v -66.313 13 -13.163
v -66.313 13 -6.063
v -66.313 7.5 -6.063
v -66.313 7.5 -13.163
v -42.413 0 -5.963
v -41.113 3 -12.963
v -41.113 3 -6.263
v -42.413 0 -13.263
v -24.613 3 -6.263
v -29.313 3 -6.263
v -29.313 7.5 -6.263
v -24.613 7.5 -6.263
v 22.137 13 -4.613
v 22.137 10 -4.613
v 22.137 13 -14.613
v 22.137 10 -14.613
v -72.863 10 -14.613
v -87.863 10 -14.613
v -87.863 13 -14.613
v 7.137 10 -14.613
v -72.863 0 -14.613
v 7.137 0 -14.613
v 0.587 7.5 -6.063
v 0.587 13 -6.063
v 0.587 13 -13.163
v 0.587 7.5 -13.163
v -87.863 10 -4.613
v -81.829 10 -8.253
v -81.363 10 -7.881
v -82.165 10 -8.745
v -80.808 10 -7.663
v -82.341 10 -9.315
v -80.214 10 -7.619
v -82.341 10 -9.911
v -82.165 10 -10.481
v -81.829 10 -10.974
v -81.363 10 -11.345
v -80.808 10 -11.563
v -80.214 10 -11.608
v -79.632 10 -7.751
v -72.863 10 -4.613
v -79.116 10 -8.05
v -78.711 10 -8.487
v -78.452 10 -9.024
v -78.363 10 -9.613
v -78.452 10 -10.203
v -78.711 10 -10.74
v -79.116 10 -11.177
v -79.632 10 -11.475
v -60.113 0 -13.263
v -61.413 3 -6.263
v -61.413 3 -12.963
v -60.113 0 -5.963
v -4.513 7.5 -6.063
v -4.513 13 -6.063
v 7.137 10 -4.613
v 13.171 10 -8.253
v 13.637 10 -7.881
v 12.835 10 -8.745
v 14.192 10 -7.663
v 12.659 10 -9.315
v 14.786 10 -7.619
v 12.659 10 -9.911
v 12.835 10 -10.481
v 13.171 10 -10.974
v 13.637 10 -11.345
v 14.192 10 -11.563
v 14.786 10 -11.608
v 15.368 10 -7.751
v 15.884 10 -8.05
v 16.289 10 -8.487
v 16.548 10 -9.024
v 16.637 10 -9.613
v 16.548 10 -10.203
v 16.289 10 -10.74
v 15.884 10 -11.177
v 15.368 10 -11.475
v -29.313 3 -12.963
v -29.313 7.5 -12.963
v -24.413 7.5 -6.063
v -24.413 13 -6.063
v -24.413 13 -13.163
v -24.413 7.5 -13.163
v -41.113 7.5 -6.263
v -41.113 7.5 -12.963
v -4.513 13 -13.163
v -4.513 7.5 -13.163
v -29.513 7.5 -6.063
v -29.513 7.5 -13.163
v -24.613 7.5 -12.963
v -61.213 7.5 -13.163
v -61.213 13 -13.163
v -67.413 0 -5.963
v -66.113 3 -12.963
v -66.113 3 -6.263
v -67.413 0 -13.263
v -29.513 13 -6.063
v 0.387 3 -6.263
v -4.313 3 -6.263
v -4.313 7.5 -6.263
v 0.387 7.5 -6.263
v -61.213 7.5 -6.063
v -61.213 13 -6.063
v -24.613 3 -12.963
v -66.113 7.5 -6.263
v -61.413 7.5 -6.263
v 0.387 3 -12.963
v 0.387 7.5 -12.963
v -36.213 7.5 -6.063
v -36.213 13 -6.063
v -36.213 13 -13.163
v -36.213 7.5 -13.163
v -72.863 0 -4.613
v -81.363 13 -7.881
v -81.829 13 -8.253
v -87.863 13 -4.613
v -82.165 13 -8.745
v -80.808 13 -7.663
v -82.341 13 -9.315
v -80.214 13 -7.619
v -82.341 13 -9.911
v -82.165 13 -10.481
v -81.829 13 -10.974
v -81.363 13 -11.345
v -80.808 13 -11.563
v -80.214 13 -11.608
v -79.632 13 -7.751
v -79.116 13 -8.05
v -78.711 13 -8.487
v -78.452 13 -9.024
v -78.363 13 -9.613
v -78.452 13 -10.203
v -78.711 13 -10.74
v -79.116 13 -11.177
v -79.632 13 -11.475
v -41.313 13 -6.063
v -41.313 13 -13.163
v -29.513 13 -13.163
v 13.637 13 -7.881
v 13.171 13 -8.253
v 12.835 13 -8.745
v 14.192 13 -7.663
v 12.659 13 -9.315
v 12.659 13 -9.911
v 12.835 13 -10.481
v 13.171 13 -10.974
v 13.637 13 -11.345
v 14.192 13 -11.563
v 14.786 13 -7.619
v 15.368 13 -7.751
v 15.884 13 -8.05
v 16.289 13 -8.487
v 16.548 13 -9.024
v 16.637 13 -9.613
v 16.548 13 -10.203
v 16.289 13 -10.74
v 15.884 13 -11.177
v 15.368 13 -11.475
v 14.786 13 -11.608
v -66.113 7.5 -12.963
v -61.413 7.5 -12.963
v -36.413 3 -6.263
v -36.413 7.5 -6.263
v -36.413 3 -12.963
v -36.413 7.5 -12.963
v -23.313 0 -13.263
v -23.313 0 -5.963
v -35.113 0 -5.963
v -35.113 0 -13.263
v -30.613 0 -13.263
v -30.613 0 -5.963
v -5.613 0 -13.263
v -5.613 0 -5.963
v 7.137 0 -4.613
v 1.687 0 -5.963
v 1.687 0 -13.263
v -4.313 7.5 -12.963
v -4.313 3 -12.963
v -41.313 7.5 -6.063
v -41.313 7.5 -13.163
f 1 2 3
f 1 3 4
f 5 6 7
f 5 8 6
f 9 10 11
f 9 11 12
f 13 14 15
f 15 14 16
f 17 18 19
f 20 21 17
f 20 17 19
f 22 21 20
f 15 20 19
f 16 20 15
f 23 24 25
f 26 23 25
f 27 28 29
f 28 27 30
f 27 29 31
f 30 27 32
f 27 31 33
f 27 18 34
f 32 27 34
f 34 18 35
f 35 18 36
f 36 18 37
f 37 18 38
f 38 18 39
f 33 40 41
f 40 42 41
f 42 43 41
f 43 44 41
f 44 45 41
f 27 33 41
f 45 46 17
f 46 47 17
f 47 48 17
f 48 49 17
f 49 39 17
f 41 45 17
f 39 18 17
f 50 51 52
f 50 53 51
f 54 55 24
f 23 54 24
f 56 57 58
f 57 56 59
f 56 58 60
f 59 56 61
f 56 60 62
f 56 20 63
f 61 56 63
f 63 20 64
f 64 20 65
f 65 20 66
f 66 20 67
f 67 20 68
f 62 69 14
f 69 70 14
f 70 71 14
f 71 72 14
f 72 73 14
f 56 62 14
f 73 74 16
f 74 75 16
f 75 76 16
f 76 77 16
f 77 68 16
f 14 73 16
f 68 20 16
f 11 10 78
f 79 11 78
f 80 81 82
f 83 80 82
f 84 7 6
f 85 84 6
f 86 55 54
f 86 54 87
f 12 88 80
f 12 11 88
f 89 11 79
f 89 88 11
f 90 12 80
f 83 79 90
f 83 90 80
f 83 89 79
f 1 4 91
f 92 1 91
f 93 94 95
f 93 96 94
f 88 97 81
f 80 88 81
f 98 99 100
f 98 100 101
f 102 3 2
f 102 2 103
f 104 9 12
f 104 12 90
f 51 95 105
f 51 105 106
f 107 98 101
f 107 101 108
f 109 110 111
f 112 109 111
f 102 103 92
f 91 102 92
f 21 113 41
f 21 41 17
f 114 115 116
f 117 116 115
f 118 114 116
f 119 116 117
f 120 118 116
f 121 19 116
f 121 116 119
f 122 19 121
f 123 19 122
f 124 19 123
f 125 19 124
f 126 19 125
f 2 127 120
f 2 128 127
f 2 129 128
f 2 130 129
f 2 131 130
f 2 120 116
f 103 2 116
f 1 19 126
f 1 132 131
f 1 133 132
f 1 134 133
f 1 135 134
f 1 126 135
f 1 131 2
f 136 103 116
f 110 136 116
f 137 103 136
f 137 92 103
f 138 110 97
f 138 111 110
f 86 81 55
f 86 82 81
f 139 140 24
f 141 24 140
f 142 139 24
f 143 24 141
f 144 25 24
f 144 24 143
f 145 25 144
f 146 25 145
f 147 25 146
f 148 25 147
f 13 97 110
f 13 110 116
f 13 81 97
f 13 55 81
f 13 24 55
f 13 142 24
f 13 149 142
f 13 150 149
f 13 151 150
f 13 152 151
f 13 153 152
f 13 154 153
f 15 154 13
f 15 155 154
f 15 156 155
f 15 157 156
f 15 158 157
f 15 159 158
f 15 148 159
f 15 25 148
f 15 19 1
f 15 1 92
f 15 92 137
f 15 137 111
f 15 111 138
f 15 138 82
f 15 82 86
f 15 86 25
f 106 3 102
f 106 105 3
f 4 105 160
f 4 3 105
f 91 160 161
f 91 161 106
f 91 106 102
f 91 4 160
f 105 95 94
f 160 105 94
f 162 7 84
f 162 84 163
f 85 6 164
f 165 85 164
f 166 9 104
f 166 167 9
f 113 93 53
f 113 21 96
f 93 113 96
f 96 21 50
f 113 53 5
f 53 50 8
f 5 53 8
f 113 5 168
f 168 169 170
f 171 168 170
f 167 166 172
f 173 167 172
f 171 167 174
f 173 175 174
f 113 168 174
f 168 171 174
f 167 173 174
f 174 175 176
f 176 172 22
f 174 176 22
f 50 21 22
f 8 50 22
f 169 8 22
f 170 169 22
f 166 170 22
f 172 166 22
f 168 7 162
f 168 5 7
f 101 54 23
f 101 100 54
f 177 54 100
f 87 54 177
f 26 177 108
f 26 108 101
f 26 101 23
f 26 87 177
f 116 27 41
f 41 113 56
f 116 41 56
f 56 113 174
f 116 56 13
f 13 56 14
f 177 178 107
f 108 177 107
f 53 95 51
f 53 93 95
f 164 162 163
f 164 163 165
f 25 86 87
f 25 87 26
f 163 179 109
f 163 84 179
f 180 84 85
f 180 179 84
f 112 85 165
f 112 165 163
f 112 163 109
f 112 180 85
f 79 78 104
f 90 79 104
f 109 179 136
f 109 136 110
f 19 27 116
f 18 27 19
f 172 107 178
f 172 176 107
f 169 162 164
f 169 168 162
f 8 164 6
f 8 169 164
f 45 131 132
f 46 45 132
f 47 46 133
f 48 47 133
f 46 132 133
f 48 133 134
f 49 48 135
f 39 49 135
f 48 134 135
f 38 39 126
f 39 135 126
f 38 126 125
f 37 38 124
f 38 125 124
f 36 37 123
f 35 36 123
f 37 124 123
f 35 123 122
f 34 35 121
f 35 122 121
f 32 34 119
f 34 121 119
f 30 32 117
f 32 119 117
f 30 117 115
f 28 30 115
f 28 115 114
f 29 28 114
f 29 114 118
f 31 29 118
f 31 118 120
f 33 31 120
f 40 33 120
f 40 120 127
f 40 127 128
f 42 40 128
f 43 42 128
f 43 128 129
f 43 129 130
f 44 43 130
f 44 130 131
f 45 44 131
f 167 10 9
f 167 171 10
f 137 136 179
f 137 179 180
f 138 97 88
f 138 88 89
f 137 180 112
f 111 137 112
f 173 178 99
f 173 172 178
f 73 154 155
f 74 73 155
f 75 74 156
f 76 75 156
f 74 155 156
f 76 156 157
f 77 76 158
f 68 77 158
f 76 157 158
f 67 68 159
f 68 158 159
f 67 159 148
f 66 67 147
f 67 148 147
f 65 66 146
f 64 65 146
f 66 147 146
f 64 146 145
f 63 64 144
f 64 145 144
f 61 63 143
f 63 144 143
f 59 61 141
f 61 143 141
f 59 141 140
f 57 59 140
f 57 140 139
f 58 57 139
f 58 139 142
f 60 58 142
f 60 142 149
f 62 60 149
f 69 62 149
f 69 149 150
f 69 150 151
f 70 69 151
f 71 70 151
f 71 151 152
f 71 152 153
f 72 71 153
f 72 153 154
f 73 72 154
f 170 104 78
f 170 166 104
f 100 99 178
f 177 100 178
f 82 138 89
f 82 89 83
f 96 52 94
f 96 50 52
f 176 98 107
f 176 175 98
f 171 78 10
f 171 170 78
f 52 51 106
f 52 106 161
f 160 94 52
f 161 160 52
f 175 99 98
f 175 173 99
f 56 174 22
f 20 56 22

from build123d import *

# Parameters (mm, degrees)
SKETCH1_W           = 80
SKETCH1_H           = 10
BOSS_EXTRUDE1_DEPTH = 10
SKETCH2_W           = 4.7
SKETCH2_H           = 6.7
CUT_EXTRUDE1_DEPTH  = 7
SKETCH3_W           = 4.7
SKETCH3_H           = 6.7
SKETCH4_W           = 7.3
SKETCH4_H           = 7.3
SKETCH5_W           = 4.7
SKETCH5_H           = 6.7
SKETCH6_W           = 7.3
SKETCH6_H           = 7.3
SKETCH8_W           = 4.7
SKETCH8_H           = 6.7
SKETCH9_W           = 7.3
SKETCH9_H           = 7.3
SKETCH10_W          = 4.7
SKETCH10_H          = 6.7
SKETCH11_W          = 7.3
SKETCH11_H          = 7.3
SKETCH12_W          = 110
SKETCH12_H          = 10
SKETCH12_W_2        = 4.7
SKETCH12_H_2        = 6.7
BOSS_EXTRUDE2_DEPTH = 3
SKETCH13_W          = 5.1
SKETCH13_H          = 7.1
CUT_EXTRUDE2_DEPTH  = 5.5
SKETCH14_R          = 2
CUT_EXTRUDE3_DEPTH  = 10


with BuildPart() as part:
    # Sketch1 → Boss-Extrude1 (new body)
    with BuildSketch(Plane(origin=(0, 0, 0), x_dir=(1, 0, 0), z_dir=(0, 1, 0))):
        with Locations((-32.862980486, 9.613188287)):
            Rectangle(SKETCH1_W, SKETCH1_H)
    extrude(amount=BOSS_EXTRUDE1_DEPTH)

    # Sketch2 → Cut-Extrude1 (cut)
    with BuildSketch(Plane(origin=(0, 10, 0), x_dir=(1, 0, 0), z_dir=(0, 1, 0))):
        with Locations((-26.962980486, 9.613188287)):
            Rectangle(SKETCH2_W, SKETCH2_H)
        with Locations((-38.762980486, 9.613188287)):
            Rectangle(SKETCH2_W, SKETCH2_H)
        with Locations((-1.962980486, 9.613188287)):
            Rectangle(SKETCH2_W, SKETCH2_H)
        with Locations((-63.762980486, 9.613188287)):
            Rectangle(SKETCH2_W, SKETCH2_H)
    extrude(amount=-CUT_EXTRUDE1_DEPTH, mode=Mode.SUBTRACT)

    # Sketch3 → Cut-Loft1 section 0
    with BuildSketch(Plane(origin=(0, 3, 0), x_dir=(1, 0, 0), z_dir=(0, 1, 0))):
        with Locations((-38.762980486, 9.613188287)):
            Rectangle(SKETCH3_W, SKETCH3_H)
    # Sketch4 → Cut-Loft1 section 1
    with BuildSketch(Plane.XZ):
        with Locations((-38.762980486, -9.613188287)):
            Rectangle(SKETCH4_W, SKETCH4_H)
    loft(mode=Mode.SUBTRACT)

    # Sketch5 → Cut-Loft2 section 0
    with BuildSketch(Plane(origin=(0, 3, 0), x_dir=(1, 0, 0), z_dir=(0, 1, 0))):
        with Locations((-63.762980486, 9.613188287)):
            Rectangle(SKETCH5_W, SKETCH5_H)
    # Sketch6 → Cut-Loft2 section 1
    with BuildSketch(Plane.XZ):
        with Locations((-63.762980486, -9.613188287)):
            Rectangle(SKETCH6_W, SKETCH6_H)
    loft(mode=Mode.SUBTRACT)

    # Sketch8 → Cut-Loft3 section 0
    with BuildSketch(Plane(origin=(0, 3, 0), x_dir=(1, 0, 0), z_dir=(0, 1, 0))):
        with Locations((-26.962980486, 9.613188287)):
            Rectangle(SKETCH8_W, SKETCH8_H)
    # Sketch9 → Cut-Loft3 section 1
    with BuildSketch(Plane.XZ):
        with Locations((-26.962980486, -9.613188287)):
            Rectangle(SKETCH9_W, SKETCH9_H)
    loft(mode=Mode.SUBTRACT)

    # Sketch10 → Cut-Loft4 section 0
    with BuildSketch(Plane(origin=(0, 3, 0), x_dir=(1, 0, 0), z_dir=(0, 1, 0))):
        with Locations((-1.962980486, 9.613188287)):
            Rectangle(SKETCH10_W, SKETCH10_H)
    # Sketch11 → Cut-Loft4 section 1
    with BuildSketch(Plane.XZ):
        with Locations((-1.962980486, -9.613188287)):
            Rectangle(SKETCH11_W, SKETCH11_H)
    loft(mode=Mode.SUBTRACT)

    # Sketch12 → Boss-Extrude2 (add)
    with BuildSketch(Plane(origin=(0, 10, 0), x_dir=(1, 0, 0), z_dir=(0, 1, 0))):
        with Locations((-32.862980486, 9.613188287)):
            Rectangle(SKETCH12_W, SKETCH12_H)
        with Locations((-63.762980486, 9.613188287)):
            Rectangle(SKETCH12_W_2, SKETCH12_H_2, mode=Mode.SUBTRACT)
        with Locations((-38.762980486, 9.613188287)):
            Rectangle(SKETCH12_W_2, SKETCH12_H_2, mode=Mode.SUBTRACT)
        with Locations((-26.962980486, 9.613188287)):
            Rectangle(SKETCH12_W_2, SKETCH12_H_2, mode=Mode.SUBTRACT)
        with Locations((-1.962980486, 9.613188287)):
            Rectangle(SKETCH12_W_2, SKETCH12_H_2, mode=Mode.SUBTRACT)
    extrude(amount=BOSS_EXTRUDE2_DEPTH)

    # Sketch13 → Cut-Extrude2 (cut)
    with BuildSketch(Plane(origin=(0, 13, 0), x_dir=(1, 0, 0), z_dir=(0, 1, 0))):
        with Locations((-63.762980486, 9.613188287)):
            Rectangle(SKETCH13_W, SKETCH13_H)
        with Locations((-38.762980486, 9.613188287)):
            Rectangle(SKETCH13_W, SKETCH13_H)
        with Locations((-26.962980486, 9.613188287)):
            Rectangle(SKETCH13_W, SKETCH13_H)
        with Locations((-1.962980486, 9.613188287)):
            Rectangle(SKETCH13_W, SKETCH13_H)
    extrude(amount=-CUT_EXTRUDE2_DEPTH, mode=Mode.SUBTRACT)

    # Sketch14 → Cut-Extrude3 (cut)
    with BuildSketch(Plane(origin=(0, 13, 0), x_dir=(1, 0, 0), z_dir=(0, 1, 0))):
        with Locations((14.637019514, 9.613188287)):
            Circle(SKETCH14_R)
        with Locations((-80.362980486, 9.613188287)):
            Circle(SKETCH14_R)
    extrude(amount=-CUT_EXTRUDE3_DEPTH, mode=Mode.SUBTRACT)


solid = part.part
